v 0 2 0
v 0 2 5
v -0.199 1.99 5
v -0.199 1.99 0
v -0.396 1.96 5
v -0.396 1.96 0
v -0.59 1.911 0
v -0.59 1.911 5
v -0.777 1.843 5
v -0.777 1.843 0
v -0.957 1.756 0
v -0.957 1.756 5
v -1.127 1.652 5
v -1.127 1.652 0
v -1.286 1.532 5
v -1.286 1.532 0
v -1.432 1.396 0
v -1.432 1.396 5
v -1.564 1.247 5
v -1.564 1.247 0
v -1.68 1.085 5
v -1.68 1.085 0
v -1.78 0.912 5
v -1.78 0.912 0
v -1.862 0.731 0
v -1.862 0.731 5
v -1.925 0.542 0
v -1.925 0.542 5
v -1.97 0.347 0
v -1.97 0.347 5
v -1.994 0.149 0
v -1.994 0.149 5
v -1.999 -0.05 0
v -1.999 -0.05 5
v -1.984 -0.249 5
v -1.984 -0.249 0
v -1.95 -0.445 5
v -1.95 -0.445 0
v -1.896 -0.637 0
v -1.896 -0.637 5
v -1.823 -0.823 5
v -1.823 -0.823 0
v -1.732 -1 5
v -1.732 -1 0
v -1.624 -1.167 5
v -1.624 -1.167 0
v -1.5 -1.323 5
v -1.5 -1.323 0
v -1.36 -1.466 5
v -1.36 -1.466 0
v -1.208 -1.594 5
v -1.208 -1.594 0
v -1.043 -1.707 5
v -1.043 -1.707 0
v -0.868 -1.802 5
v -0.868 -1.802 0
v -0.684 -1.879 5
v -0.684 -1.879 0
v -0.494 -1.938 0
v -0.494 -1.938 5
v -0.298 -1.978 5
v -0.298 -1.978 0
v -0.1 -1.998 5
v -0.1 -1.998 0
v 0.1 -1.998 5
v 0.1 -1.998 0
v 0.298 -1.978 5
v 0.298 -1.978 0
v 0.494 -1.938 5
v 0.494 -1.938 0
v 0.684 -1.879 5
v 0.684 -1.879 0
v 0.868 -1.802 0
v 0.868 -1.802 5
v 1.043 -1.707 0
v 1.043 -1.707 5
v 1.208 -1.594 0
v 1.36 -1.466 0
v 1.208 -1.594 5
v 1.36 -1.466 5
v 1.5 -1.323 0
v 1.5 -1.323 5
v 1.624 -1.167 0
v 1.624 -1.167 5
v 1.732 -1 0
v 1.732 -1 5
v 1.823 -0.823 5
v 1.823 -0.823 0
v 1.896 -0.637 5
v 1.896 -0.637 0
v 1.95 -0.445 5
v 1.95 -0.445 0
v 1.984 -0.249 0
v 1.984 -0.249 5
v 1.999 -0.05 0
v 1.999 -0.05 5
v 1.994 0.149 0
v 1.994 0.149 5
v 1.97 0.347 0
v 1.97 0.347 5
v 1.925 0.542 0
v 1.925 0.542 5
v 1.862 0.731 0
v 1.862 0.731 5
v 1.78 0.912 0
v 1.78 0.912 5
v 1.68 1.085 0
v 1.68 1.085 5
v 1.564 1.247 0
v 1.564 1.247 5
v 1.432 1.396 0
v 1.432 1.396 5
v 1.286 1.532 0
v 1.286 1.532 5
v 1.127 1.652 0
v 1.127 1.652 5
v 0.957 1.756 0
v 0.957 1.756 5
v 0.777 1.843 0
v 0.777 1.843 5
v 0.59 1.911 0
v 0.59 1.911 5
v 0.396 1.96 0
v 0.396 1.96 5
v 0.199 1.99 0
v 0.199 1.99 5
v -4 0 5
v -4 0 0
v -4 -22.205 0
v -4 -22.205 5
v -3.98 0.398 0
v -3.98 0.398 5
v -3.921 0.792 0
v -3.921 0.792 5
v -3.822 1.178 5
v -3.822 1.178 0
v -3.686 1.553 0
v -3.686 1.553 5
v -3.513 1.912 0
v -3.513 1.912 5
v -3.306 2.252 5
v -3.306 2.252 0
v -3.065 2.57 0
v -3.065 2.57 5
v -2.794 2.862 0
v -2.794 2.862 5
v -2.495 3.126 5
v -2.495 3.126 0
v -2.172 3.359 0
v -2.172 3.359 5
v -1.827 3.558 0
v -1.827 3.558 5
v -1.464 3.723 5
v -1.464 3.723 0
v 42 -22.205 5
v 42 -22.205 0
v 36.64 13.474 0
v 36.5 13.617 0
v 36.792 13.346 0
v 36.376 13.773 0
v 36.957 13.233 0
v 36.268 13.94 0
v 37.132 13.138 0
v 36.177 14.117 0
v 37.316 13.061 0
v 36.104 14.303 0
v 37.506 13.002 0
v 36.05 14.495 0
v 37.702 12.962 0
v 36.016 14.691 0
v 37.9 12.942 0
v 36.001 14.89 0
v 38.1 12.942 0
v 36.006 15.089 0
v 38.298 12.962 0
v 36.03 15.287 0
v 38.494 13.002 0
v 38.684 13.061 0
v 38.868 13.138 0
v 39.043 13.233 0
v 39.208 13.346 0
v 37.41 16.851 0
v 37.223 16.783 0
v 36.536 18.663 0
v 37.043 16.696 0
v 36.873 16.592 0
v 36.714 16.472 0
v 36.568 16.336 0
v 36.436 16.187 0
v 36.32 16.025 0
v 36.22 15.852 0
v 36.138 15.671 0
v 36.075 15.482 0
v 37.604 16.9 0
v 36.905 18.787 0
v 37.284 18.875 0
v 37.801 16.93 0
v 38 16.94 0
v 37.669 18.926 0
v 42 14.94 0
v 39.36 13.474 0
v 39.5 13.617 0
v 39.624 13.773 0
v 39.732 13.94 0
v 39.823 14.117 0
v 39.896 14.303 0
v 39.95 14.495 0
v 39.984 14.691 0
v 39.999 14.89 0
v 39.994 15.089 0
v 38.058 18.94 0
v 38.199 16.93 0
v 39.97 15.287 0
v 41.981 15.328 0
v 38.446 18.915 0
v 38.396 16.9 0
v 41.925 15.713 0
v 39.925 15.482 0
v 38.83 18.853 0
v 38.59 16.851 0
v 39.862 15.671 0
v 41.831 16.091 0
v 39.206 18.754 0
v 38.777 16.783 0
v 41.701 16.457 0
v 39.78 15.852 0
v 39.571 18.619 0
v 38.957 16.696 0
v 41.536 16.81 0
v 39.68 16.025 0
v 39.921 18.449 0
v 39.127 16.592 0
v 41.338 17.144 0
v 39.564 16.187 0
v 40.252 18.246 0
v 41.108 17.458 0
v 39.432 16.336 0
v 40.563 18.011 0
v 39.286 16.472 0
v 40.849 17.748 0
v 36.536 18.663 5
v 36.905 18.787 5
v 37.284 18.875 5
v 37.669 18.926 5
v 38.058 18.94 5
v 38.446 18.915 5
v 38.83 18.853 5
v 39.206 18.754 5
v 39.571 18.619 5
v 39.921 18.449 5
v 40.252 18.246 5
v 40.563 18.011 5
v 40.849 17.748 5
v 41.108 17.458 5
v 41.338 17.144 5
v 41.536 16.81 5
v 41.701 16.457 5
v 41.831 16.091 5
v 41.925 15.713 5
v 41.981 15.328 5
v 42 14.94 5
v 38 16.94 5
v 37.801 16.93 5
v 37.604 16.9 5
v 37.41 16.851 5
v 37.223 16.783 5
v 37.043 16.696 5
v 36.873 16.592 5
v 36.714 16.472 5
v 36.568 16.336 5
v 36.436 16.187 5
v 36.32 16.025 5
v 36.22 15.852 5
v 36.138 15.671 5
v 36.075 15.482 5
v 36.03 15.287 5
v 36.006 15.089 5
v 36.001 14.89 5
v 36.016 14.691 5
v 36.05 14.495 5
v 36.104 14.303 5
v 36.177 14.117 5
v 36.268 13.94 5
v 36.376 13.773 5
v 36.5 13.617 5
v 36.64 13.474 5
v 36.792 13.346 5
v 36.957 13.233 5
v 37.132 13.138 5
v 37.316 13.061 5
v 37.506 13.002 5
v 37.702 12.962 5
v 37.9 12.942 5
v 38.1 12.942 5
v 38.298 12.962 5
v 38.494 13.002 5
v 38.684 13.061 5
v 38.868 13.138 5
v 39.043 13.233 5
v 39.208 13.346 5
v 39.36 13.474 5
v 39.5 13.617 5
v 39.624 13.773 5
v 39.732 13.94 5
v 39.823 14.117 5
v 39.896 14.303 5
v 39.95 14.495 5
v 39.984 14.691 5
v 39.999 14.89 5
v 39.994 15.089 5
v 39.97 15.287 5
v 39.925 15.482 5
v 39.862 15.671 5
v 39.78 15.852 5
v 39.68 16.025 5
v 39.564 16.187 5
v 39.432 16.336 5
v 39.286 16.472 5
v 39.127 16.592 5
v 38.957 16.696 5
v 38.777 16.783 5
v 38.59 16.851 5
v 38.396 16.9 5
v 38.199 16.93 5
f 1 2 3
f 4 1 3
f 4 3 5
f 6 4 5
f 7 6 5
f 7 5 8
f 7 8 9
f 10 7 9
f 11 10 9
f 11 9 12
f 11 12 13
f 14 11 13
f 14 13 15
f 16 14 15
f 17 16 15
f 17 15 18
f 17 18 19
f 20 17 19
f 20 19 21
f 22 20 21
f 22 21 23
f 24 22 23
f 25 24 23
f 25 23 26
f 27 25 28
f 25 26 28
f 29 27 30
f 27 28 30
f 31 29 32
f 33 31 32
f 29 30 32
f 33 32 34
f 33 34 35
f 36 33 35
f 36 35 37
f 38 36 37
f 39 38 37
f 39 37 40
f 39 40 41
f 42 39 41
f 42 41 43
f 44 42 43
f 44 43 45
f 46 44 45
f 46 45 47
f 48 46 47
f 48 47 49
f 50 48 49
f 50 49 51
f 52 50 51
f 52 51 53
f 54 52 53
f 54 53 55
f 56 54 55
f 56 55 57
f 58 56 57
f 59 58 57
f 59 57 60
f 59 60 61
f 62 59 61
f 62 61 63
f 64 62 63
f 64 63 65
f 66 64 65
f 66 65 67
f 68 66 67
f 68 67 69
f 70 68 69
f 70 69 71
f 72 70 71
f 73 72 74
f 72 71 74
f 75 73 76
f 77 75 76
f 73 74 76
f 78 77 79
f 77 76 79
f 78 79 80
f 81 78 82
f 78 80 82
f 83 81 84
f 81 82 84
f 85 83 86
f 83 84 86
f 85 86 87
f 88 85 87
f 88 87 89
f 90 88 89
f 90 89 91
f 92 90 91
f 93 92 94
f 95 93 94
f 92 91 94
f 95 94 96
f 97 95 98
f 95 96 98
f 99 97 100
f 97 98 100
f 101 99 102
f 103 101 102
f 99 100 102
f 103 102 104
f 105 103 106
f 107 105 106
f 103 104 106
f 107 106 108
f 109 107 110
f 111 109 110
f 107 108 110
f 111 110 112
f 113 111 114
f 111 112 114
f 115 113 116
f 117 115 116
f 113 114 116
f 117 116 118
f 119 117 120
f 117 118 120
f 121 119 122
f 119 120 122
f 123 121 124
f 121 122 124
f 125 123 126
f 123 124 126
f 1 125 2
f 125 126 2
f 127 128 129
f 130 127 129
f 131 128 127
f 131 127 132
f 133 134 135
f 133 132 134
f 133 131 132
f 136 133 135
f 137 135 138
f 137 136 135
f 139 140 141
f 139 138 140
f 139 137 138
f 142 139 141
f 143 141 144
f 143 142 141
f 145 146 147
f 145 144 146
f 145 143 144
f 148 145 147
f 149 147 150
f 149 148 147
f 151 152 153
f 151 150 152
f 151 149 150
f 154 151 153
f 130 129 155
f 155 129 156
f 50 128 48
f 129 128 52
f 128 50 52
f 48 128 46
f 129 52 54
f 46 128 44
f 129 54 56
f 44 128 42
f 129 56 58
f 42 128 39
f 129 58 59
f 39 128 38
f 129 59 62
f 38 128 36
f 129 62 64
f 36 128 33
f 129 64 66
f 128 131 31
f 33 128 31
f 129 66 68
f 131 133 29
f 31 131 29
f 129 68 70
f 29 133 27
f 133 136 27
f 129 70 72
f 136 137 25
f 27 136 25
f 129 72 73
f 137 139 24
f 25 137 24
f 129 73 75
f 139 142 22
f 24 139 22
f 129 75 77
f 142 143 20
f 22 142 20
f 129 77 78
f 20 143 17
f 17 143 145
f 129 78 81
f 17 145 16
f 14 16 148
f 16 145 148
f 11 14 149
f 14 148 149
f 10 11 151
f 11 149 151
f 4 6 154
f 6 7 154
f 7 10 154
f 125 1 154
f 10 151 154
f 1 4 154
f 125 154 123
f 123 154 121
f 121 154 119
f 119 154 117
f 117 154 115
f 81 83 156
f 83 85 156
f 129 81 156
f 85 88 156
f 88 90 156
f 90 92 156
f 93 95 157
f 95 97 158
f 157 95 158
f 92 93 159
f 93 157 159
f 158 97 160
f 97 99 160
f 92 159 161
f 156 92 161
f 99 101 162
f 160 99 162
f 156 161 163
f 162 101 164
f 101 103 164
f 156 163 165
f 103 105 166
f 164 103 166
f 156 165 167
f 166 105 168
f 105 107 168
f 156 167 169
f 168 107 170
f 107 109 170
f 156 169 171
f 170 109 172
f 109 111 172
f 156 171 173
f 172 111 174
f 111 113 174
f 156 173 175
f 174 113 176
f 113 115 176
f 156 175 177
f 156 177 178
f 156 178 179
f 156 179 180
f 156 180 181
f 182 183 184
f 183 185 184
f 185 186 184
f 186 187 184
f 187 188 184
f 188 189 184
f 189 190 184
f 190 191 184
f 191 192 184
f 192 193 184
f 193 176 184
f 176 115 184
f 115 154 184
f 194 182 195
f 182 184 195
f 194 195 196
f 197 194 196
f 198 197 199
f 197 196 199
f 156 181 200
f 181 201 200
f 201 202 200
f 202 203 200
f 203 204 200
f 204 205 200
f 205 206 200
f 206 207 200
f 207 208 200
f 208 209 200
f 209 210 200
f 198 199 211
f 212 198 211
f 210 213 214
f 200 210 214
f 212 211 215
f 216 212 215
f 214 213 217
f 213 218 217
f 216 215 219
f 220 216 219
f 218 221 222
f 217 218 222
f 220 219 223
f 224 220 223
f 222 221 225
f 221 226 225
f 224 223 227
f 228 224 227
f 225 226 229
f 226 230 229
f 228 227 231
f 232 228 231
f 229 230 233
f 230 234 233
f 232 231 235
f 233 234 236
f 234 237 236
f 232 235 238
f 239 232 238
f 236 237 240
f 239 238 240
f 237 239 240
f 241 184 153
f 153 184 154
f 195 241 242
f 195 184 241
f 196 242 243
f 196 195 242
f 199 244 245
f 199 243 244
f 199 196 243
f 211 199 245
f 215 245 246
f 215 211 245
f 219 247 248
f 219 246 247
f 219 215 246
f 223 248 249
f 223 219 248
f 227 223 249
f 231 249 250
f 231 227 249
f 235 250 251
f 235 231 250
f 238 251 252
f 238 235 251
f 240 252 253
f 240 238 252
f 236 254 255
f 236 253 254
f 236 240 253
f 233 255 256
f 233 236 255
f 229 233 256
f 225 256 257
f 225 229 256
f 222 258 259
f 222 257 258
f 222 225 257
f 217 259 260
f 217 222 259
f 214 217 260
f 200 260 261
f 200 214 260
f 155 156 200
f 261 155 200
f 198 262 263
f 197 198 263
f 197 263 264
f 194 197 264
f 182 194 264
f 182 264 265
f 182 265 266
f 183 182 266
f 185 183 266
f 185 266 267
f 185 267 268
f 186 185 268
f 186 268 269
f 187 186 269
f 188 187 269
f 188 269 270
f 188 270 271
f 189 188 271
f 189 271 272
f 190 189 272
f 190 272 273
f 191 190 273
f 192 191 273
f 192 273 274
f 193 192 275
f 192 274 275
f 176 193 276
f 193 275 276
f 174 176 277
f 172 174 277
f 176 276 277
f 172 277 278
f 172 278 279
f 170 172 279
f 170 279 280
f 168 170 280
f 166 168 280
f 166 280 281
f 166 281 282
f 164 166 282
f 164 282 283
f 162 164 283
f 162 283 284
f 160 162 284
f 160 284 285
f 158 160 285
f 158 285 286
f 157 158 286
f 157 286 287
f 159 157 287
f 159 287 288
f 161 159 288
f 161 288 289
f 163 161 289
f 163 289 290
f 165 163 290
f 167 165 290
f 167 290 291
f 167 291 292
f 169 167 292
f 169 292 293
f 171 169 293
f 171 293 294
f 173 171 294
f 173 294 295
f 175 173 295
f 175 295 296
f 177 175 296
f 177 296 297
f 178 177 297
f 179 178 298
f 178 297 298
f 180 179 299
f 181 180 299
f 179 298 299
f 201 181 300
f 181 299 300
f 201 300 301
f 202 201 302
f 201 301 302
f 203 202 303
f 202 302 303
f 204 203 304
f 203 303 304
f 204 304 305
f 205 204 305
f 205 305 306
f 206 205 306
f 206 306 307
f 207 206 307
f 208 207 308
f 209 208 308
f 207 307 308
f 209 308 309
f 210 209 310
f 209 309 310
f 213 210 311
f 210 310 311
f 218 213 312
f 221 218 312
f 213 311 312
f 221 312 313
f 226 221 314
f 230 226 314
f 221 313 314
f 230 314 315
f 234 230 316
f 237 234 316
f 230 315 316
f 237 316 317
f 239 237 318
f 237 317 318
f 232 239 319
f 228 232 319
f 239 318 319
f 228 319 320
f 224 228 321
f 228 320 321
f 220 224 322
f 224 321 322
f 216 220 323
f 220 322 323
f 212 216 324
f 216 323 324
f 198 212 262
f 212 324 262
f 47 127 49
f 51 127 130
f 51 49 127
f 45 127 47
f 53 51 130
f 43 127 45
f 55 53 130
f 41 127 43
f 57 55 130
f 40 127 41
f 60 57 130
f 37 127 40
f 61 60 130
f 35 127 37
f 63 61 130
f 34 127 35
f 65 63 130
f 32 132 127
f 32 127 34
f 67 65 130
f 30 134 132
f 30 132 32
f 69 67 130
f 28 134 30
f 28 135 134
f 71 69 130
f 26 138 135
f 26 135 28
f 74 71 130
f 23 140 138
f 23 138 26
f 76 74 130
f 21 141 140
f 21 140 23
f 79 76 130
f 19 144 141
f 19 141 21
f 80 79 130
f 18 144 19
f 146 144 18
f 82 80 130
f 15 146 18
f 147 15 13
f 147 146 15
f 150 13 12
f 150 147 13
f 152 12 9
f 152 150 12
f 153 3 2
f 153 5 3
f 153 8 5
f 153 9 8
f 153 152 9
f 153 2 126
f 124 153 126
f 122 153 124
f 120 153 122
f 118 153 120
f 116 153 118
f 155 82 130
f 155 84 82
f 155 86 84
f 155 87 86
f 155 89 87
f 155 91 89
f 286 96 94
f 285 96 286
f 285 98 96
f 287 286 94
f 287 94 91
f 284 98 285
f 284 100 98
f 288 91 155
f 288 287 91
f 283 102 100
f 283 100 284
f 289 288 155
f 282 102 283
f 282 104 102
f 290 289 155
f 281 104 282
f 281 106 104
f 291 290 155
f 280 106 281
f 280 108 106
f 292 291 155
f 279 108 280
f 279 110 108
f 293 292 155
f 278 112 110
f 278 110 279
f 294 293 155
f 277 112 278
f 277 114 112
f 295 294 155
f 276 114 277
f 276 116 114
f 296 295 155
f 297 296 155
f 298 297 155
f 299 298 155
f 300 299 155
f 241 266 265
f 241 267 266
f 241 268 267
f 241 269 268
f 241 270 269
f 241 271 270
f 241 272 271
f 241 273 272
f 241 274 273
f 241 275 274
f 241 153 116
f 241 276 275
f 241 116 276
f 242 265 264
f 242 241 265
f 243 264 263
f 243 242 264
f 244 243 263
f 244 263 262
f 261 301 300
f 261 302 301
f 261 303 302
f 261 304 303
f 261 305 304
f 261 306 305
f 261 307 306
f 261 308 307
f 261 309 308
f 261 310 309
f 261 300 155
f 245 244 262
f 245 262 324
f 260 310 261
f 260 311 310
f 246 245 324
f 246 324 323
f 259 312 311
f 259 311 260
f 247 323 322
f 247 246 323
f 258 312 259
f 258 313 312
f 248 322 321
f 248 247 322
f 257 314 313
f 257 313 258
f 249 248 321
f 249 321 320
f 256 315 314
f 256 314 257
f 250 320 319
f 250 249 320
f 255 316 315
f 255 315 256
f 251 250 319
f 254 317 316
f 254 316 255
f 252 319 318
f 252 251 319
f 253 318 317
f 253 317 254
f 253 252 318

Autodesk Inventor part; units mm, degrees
ref_plane "YZ Plane" through (0, 0, 0) normal (1, 0, 0) x (0, 1, 0)
ref_plane "XZ Plane" through (0, 0, 0) normal (0, 1, 0) x (-1, 0, 0)
ref_plane "XY Plane" through (0, 0, 0) normal (0, 0, 1) x (1, 0, 0)
sketch "スケッチ1" plane through (0, 0, 0) normal (0, 0, 1) x (1, 0, 0)
  line L0 (0, 0) -> (38, 14.94) construction
  line L1 (36.5364, 18.6626) -> (-1.4636, 3.7226)
  line L2 (-4, 0) -> (-4, -22.2053)
  line L3 (-4, -22.2053) -> (42, -22.2053)
  line L4 (42, -22.2053) -> (42, 14.94)
  arc A0 (-1.4636, 3.7226) -> (-4, 0) centre (0, 0) ccw
  arc A1 (42, 14.94) -> (36.5364, 18.6626) centre (38, 14.94) ccw
  dimension "d0" = 38
  dimension "d1" = 14.94
  dimension "d2" = 4
extrude "押し出し1" add sketch "スケッチ1" along normal blind 5
hole "穴1" at (0, 0, 0) at (38, 14.94, 0) direction (0, 0, 1) diameter 4 end through all
properties part number "COXA_ROLL_COUPLER_BACK"
